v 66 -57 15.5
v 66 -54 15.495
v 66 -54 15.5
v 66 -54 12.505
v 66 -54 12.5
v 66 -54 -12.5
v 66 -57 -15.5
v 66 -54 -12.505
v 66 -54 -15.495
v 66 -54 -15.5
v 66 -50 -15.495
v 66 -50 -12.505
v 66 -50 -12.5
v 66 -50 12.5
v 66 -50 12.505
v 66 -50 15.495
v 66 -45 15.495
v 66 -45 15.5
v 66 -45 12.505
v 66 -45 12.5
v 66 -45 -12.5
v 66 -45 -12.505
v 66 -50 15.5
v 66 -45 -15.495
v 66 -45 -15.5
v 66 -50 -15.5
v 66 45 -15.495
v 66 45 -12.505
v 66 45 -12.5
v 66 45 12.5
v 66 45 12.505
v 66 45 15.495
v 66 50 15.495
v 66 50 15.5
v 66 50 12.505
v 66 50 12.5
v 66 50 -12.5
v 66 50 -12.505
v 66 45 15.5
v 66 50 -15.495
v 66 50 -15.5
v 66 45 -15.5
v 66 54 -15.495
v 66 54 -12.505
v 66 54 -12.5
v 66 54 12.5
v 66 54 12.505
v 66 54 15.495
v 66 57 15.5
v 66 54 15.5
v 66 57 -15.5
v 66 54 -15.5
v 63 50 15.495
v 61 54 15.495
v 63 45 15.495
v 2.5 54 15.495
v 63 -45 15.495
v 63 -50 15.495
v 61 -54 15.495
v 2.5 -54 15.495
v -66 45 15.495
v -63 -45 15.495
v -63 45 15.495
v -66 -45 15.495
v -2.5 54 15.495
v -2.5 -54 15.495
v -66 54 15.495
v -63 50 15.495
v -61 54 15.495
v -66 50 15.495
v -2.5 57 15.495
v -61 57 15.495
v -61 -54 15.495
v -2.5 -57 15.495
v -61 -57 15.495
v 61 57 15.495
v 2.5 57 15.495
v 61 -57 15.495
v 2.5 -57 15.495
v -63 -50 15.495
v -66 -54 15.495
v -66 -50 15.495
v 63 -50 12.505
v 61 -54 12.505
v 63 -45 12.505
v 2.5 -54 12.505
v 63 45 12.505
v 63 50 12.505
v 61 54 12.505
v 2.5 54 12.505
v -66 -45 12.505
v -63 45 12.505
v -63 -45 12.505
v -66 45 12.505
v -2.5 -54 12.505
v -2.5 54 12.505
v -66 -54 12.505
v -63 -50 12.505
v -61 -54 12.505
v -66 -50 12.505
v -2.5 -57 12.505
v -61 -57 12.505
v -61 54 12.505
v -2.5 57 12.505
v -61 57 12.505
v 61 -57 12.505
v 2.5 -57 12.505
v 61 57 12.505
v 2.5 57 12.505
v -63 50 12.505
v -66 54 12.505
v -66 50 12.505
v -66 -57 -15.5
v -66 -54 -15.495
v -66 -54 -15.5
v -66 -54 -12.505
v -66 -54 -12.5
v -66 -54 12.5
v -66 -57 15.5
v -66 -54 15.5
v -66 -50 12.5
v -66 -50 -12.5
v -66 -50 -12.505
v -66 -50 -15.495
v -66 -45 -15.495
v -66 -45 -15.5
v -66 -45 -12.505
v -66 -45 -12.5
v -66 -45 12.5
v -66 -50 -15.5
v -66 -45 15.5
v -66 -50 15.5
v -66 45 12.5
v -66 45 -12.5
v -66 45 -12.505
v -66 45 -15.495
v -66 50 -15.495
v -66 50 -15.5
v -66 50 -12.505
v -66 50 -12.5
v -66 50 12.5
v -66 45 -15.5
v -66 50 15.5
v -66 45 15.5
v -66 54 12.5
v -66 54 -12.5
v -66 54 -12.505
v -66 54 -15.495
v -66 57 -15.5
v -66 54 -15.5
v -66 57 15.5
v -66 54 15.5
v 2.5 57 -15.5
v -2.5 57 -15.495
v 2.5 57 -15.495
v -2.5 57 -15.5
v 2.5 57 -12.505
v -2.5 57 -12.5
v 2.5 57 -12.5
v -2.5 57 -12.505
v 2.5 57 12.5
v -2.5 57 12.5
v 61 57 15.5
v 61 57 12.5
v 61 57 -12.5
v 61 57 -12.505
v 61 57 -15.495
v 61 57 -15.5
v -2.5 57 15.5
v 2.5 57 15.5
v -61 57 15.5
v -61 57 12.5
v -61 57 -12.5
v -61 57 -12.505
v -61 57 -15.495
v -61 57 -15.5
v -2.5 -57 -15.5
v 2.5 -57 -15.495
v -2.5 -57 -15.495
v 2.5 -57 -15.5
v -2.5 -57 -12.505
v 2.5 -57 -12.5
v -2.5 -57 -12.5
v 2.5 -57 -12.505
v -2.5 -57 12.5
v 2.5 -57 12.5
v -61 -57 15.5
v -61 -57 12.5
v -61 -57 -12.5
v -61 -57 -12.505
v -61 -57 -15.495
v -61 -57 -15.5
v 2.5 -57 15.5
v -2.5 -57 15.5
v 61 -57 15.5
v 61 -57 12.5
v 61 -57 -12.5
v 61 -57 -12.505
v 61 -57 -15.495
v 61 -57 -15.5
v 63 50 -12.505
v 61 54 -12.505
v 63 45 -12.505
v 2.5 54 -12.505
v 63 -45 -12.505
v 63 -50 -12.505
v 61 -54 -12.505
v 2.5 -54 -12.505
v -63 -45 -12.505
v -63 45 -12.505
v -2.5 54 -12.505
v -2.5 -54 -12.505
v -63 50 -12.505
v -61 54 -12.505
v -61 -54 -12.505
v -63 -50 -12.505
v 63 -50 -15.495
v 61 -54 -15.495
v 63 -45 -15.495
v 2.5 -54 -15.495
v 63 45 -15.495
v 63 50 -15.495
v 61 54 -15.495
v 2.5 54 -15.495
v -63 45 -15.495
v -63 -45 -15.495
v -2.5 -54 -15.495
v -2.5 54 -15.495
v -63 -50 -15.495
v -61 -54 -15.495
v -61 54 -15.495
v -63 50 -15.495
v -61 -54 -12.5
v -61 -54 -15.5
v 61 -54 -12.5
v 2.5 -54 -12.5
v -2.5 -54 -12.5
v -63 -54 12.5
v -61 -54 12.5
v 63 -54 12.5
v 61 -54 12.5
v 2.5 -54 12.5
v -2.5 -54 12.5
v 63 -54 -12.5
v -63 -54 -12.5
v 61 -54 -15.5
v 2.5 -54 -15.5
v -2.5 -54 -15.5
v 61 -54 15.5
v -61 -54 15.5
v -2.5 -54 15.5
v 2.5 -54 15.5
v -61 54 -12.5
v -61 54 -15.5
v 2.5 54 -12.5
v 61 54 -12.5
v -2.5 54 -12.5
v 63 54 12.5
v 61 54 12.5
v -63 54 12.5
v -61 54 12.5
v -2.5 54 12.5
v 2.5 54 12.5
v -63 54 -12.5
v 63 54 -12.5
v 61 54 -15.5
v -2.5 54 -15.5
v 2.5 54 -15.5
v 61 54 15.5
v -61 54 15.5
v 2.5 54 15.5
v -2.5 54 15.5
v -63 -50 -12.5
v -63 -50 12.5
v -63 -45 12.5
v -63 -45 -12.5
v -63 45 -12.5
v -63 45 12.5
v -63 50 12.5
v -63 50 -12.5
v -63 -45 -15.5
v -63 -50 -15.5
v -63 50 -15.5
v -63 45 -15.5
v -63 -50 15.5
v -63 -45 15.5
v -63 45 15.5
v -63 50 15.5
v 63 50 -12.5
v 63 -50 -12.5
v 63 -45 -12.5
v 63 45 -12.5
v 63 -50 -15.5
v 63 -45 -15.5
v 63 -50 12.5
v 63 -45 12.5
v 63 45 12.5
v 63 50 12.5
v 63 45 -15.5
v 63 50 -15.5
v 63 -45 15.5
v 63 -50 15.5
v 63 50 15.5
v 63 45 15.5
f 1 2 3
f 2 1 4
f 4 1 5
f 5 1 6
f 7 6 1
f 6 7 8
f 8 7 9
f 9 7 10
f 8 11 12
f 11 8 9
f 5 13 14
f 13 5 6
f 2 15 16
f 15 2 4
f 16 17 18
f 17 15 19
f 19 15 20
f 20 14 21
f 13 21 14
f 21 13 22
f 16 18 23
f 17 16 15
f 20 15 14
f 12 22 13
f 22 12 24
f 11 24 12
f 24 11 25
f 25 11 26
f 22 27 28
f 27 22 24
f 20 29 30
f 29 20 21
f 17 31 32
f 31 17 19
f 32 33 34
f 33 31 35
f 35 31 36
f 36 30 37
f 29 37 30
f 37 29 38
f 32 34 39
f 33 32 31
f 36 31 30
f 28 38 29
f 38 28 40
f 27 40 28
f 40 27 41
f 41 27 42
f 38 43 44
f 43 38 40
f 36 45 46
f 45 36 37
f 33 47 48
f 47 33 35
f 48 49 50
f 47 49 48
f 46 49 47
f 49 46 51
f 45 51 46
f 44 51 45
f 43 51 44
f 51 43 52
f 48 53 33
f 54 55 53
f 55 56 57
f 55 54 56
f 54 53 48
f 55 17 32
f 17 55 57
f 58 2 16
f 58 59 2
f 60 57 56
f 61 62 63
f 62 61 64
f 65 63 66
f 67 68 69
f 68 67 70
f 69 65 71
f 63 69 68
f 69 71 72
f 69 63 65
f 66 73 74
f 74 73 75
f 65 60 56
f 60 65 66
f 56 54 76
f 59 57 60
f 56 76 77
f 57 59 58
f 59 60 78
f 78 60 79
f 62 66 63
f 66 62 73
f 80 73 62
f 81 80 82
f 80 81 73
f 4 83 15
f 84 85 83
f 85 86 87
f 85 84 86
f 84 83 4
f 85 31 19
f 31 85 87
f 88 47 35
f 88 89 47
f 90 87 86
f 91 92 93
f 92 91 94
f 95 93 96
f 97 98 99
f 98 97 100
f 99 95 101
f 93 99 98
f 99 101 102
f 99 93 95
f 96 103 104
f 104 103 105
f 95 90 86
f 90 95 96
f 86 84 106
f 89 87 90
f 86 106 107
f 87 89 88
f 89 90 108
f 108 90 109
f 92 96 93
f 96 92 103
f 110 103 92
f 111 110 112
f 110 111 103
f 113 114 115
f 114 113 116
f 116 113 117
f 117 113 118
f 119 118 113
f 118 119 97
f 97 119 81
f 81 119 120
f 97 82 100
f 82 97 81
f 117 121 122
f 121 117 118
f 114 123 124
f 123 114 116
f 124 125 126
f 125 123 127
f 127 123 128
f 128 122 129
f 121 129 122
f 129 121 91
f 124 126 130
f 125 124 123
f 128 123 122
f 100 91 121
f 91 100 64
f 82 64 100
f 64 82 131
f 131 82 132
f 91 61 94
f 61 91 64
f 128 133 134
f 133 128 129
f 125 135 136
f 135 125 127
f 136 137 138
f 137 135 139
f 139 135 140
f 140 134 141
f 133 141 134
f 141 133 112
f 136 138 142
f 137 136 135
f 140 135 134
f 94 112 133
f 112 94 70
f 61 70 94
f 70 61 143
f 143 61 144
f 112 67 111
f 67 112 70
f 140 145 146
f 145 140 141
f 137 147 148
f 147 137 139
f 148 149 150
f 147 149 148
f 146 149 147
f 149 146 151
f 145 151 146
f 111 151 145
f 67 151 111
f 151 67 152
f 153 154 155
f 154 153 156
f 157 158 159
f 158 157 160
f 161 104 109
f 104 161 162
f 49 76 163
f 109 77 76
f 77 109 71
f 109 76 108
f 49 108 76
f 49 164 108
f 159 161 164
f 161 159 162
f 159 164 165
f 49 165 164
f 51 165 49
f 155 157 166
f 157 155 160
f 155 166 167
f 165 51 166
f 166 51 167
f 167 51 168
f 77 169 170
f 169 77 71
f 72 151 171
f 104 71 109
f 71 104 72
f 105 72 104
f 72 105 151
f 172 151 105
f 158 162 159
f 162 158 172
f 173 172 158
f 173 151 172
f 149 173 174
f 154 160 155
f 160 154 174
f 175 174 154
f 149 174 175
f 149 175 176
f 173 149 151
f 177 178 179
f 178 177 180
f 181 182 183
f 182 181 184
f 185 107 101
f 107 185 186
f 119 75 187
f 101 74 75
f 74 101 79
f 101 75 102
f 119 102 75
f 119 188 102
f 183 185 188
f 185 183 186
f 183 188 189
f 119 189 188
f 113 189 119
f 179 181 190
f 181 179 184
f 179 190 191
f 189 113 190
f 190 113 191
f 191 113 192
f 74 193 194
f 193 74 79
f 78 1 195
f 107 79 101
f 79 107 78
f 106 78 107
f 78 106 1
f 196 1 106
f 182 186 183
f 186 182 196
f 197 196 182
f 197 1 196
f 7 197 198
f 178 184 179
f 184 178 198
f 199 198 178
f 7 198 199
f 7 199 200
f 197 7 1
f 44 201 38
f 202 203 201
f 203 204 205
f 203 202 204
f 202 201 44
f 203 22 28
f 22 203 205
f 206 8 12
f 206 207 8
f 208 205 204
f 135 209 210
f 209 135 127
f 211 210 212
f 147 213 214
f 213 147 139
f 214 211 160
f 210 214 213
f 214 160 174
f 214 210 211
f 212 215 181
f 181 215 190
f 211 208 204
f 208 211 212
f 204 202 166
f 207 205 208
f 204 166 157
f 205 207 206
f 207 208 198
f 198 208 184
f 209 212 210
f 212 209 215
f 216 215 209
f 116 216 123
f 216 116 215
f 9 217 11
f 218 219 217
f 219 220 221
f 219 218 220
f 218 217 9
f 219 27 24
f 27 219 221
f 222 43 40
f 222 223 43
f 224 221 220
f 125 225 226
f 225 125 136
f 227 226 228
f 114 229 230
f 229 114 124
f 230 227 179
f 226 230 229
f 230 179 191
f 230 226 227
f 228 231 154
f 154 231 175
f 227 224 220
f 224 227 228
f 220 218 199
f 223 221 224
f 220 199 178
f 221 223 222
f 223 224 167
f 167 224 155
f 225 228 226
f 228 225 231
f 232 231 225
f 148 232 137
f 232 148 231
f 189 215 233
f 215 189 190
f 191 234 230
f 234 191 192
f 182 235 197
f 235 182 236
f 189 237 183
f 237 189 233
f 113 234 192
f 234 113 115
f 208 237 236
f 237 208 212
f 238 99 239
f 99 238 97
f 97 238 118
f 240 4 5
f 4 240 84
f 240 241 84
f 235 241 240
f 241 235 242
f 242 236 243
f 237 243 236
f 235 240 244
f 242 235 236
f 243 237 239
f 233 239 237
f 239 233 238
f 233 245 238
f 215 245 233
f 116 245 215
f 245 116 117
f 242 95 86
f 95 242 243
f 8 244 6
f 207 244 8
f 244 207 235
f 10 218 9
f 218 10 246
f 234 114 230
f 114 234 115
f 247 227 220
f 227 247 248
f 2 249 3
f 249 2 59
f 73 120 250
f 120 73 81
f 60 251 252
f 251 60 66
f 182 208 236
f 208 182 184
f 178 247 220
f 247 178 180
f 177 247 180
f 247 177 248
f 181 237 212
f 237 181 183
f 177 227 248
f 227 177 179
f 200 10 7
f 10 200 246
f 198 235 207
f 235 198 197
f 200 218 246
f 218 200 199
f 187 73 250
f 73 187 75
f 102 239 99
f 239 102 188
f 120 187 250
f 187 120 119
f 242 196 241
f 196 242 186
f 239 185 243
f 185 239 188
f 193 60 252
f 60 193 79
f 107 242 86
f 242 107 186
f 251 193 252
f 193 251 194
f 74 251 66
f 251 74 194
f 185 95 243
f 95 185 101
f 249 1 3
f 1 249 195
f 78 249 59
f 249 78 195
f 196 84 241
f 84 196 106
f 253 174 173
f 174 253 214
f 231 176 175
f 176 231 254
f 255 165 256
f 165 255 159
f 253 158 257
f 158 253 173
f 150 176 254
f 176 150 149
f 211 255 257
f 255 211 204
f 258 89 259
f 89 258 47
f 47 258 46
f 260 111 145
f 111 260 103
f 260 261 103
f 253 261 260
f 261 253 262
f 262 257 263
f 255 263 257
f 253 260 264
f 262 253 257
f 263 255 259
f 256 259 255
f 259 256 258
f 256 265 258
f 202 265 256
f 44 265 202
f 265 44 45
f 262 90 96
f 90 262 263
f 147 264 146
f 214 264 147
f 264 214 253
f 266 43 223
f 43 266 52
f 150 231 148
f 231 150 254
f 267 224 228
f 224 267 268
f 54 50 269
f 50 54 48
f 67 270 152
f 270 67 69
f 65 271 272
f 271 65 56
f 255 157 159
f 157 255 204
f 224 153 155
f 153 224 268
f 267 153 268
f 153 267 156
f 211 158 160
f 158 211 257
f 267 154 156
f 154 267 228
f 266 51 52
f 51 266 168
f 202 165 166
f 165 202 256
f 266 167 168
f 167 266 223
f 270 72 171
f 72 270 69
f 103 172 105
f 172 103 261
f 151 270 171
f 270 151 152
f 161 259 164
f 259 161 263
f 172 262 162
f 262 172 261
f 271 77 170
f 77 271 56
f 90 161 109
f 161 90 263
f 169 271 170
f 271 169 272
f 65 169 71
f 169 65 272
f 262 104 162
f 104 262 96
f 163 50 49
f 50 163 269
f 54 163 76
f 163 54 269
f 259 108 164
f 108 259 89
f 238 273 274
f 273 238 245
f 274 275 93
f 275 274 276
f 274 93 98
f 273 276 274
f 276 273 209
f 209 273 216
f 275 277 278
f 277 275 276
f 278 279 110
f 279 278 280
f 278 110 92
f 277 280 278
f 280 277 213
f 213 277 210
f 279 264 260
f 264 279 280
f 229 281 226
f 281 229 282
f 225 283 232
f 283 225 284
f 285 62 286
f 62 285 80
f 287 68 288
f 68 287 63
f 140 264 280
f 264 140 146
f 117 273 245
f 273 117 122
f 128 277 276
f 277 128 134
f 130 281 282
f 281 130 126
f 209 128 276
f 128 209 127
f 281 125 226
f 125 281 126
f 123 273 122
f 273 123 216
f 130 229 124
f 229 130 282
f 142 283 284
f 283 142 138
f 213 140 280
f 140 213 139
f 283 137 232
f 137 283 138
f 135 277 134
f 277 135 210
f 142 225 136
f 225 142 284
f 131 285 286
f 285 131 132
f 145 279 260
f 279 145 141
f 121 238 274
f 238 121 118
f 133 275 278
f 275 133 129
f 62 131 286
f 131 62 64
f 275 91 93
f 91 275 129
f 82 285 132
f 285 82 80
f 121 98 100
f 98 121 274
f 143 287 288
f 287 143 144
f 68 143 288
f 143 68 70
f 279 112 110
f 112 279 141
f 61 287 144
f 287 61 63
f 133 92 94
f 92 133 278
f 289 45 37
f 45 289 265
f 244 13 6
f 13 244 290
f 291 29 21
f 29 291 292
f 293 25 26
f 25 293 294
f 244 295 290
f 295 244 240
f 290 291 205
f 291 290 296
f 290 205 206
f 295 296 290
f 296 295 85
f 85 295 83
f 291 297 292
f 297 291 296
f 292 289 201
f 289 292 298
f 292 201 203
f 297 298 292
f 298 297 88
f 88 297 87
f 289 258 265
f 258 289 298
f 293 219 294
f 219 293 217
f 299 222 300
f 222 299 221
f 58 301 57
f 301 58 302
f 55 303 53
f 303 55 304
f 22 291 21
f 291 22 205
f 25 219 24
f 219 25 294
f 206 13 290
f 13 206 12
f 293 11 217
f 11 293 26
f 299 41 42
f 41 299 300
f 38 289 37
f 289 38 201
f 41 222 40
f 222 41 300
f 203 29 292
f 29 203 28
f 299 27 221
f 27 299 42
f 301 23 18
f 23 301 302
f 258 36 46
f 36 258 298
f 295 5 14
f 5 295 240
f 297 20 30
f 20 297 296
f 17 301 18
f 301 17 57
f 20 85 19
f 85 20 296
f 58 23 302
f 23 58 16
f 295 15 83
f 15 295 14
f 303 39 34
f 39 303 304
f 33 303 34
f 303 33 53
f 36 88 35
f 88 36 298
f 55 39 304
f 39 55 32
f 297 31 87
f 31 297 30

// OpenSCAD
/*
mixer case
by stahl
[office@stahlnow.com]

released under the permissive MIT license

file history
v1.0 - born
*/

/*********************************************** START OF USER VARIABLES */
// what to build
laser = false;  // set to true for laser cut rendering
render(laser);

// define inner volume in mm
length = 108;
width = 126;
height = 25; // thing + spacer + extra space

thickness = 3; // thickness of material

// slots configuration
slots = true; // make slots?

// overlap of top/bottom panels in mm
overlap = 0;
// round edge or not (applies only if overlap > 0)
round_edges = true;

// slots configuration
num_slots_right_left = 2;       // number of slots >= 0
slot_width_right_left = 5;     // width of slot
slot_clearance_right_left = 4;  // inset to slot >= 0, add plus or minus 0.1 if last tooth is missing
num_slots_front_back = 3;       
slot_width_front_back = 5;
slot_clearance_front_back = 0.0;  // inset to slot >= 0, add plus or minus 0.1 if last tooth is missing

// t-joints configuration
t_joints_front = false;
t_joints_back = false;
t_joints_right = false;
t_joints_left = false;
t_joints_top_bottom = false;

num_t_joints = 1; // number of t-joints
bolt_size = 3; // bolt size in mm (M2,M3,M4,M5, etc.)
bolt_length = 13; // bolt length in mm

// clearence between panel edge and t-joint
// could be set to a number instead of calculation
t_joints_top_left_clearance = length/(2*num_t_joints); 
t_joints_right_left_clearance = height/(2*num_t_joints);
t_joints_front_back_clearance = width/(2*num_t_joints);

joints_inset = 2; // clearance between panel edge and hole
nut_size = 7.5;// M3: 5.5, M4: 7.2, M5: 8.0
nut_thickness = 3.5;// M3: 2.4, M4: 3.5 M5: 5.6

// clearance for laser cutting in mm
laser_clearance = 5;

// colors
col_alpha = 0.8;
col_top =  "DarkGrey";
col_bottom = "DarkGrey";
col_left = "Yellow";
col_right = col_left;
col_front = "LightBlue";
col_back = "Green";

// number of fragments for round edges
$fn = 100;

glitch_corr = 0.1; // visual glitch correction (careful, this will mess with dimensions!)

/************************************************* END OF USER VARIABLES */
module render(laser) {
    if (laser) {
        laser();
    } else {
        3d();
    }
}

module 3d() {
    /*
    color("Yellow", 0.9)
    rotate([0, 0, 0])
    translate([57.5, -20.5,2.5])
    import("mixerli_v2.0.stl");
    */
    
    top();
    bottom();
    front();
    back();
    left();
    right();
}

module laser() {
    glitch_corr = 0.0; // set glitch correction to zero
    // top
    rotate([0, 0, 180])
    if (slots) {
        projection() difference() {
            top();
            right();
            left();
            slots_front_back(-(length+thickness)/2.0);
            slots_front_back((length+thickness)/2.0);
        }
    } else {
        projection() mirror([1,0,0]) top();
    }

    // bottom
    bottom_offset = -(length+2*thickness+2*overlap+laser_clearance);
    translate([0,bottom_offset,0])
    rotate([0, 0, 180]) mirror([1,0,0])
    
    if (slots) {
        projection() difference() {
            bottom();
            right();
            left();        
            slots_front_back(-(length+thickness)/2.0);
            slots_front_back((length+thickness)/2.0);
        }
    } else {
        projection() bottom();
    }
    
    // front
    front_offset = bottom_offset-(length+height)/2-overlap-2*thickness-laser_clearance;
    projection() translate([0,front_offset,0]) rotate([-90,0,180])
    
    if (slots) {
        difference() {
            front();
            slots_right_left(-(width+thickness)/2);
            slots_right_left((width+thickness)/2);
        }
    } else {
        projection() front();
    }
    
    
    // back
    back_offset = front_offset-height-2*thickness-laser_clearance;
    projection() translate([0,back_offset,0]) rotate([-90,0,180]) mirror([1,0,0]) 
    if (slots) {
        difference() {
            back();
            slots_right_left(-(width+thickness)/2);
            slots_right_left((width+thickness)/2);
        }
    } else {
        projection() back();
    }

    // left
    left_offset = back_offset-height-2*thickness-laser_clearance;
    projection() translate([0,left_offset,0]) rotate([0,90,90]) left();
    
    // right
    right_offset = left_offset-height-2*thickness-laser_clearance;
    projection() translate([0,right_offset,0]) rotate([0,90,90]) right();
    
}


module top() {
    if (round_edges) {
        p = 0;
    } else {
        p = overlap;
    }
    
    difference() {
        union() color(col_top, col_alpha) {
            minkowski()
            {
                translate([0,0, (height+thickness)/2])
                if (!round_edges) {
                    cube([width+2*thickness+overlap, length+overlap+2*thickness, thickness-0.01], center=true);
                } else {
                    cube([width+2*thickness, length+2*thickness, thickness-0.01], center=true);
                }
                if (round_edges) cylinder(r=overlap, h=0.001, $fn=100);
            }
        }
        t_joints_holes_top_bottom();
        t_joints_holes_front_back();       
        // cutouts
        color("silver")
        translate([0.0, 0.0, (height-thickness)/2])
        linear_extrude(thickness*3)
        import(file = "mixerli_v2.0_top_cutout.dxf", layer = "0");
        // engraving
        color("white")
        translate([0.0, 0.0, height/2])
        linear_extrude(thickness)
        import(file = "mixerli_v2.0_top_cutout.dxf", layer = "engraving");
    }
}

module bottom() {
    if (round_edges) {
        p = 0;
    } else {
        p = overlap;
    }
    
    difference() {
        union() color(col_bottom, col_alpha) {
            minkowski()
            {
                translate([0,0, -(height+thickness)/2])
                if (!round_edges) {
                    cube([width+2*thickness+overlap, length+overlap+2*thickness, thickness-0.01], center=true);
                } else {
                    cube([width+2*thickness, length+2*thickness, thickness-0.01], center=true);
                }
                if (round_edges) cylinder(r=overlap, h=0.001, $fn=100);
            }
        }
        t_joints_holes_top_bottom();
        t_joints_holes_front_back();
        // cutouts
        color("silver")
        mirror([1,0,0]) translate([0.0, 0.0, -height/2-1.5*thickness])
        linear_extrude(thickness*2)
        import(file = "mixerli_v2.0_bottom_cutout.dxf", layer = "0");
        // engraving
        color("white")
        mirror([1,0,0]) translate([0.0, 0.0, -height/2-thickness])
        linear_extrude(thickness)
        import(file = "mixerli_v2.0_bottom_cutout.dxf", layer = "engraving");
    }
   
}

module front() { 
    difference() {
        union() color(col_front, col_alpha) {
            translate([0.0, -(length+thickness)/2.0, 0.0])
            cube([width+2.0*thickness, thickness, height], center=true);
            // slots
            if (slots)
                slots_front_back(-(length+thickness)/2.0);
        }
        
        // t-joints
        if (t_joints_front)
            t_joints_front_back(-(length+thickness)/2.0);
        // t-joints holes (on the side)
        t_joints_holes_right_left();
        
        // cutouts
        color("silver")
        translate([0,-length/2+thickness,0]) 
        rotate([90,0,0])
        linear_extrude(thickness*3)
        import(file = "mixerli_v2.0_front_cutout.dxf", layer = "0");
        // engraving
        color("white")
        translate([0,-length/2,0]) 
        rotate([90,0,0])
        linear_extrude(thickness)
        import(file = "mixerli_v2.0_front_cutout.dxf", layer = "engraving");        
    }
}

module back() {
    difference() {
        union()
        color(col_back, col_alpha) {
            translate([0.0, (length + thickness)/2.0, 0.0])
            cube([width+2.0*thickness, thickness, height], center=true);
            if (slots)
                slots_front_back((length+thickness)/2.0);
        }
        
        // t-joints
        if (t_joints_back)
            t_joints_front_back((length+thickness)/2.0);
        // t-joints holes (on the side)
        t_joints_holes_right_left();
        
        // cutouts
        color("silver")
        mirror([1,0,0]) rotate([90,0,0]) translate([0,0,-(length/2)-1.5*thickness]) 
        linear_extrude(thickness*2)
        import(file = "mixerli_v2.0_back_cutout.dxf", layer = "0");
        // engraving
        color("White")
        mirror([1,0,0]) rotate([90,0,0]) translate([0,0,-(length/2)-1.5*thickness]) 
        linear_extrude(thickness*3)
        import(file = "mixerli_v2.0_back_cutout.dxf", layer = "engraving");
    }
}

module t_joints_holes_right_left() {
    if (t_joints_left)
        t_joints_right_left(-(width+thickness)/2.0+joints_inset, true);
    if (t_joints_right)
        t_joints_right_left((width+thickness)/2.0-joints_inset, true);
}

module t_joints_holes_top_bottom() {
    if (t_joints_top_bottom) {
        t_joints_top_bottom(-(width+thickness)/2.0+joints_inset, true);
        t_joints_top_bottom((width+thickness)/2.0-joints_inset, true);
    }
}

module t_joints_holes_front_back() {
    if (t_joints_front)
        t_joints_front_back(-(length+thickness)/2.0+joints_inset, true);
    if (t_joints_back)
        t_joints_front_back((length+thickness)/2.0-joints_inset, true);
}

module slots_front_back(d) {
    of = slot_width_front_back/2.0-thickness + slot_clearance_front_back;
    for (z = [-(height+thickness)/2.0 : height+thickness : (height+thickness)/2.0 ])
        for (x = [-width/2.0+of: (width-(2.0*of))/(num_slots_front_back-1.0) : width/2.0-of])
            translate([x, d, z])
            cube([slot_width_front_back, thickness, thickness], center=true);
}

module left() {
    difference() {
        union()
        color(col_left, col_alpha)
        {
            // panel
            translate([-(width+thickness)/2, 0, 0])
            cube([thickness, length, height], center=true);
            // slots
            if (slots)
                slots_right_left(-(width+thickness)/2);
        }
        // t-joints
        if (t_joints_left) {
            t_joints_right_left(-(width+thickness)/2);
        }
        if (t_joints_top_bottom) {
            t_joints_top_bottom(-(width+thickness)/2);
        }
        // cutouts
        color("silver")
        rotate([0,0,-90]) rotate([90,0,0]) translate([0,0,(width-thickness)/2])
        linear_extrude(thickness*2)
        import(file = "left_cutout.dxf", layer = "0");
    }
}

module right() {
    difference() {
        union()
        color(col_right, col_alpha)
        {
            // panel
            translate([(width+thickness)/2, 0, 0])
            cube([thickness, length, height], center=true);
            // slots
            if (slots)
                slots_right_left((width+thickness)/2);
        }
        // t-joints
        if (t_joints_right) {
            t_joints_right_left((width+thickness)/2);
        }
        if (t_joints_top_bottom) {
            t_joints_top_bottom((width+thickness)/2);
        }
        // cutouts
        color("silver")
        rotate([0,0,90]) rotate([90,0,0]) translate([0,0,width/2-0.5*thickness])
        linear_extrude(thickness*2)
        import(file = "right_cutout.dxf", layer = "0");
    }
}

module t_joints_front_back(w, holes=false) {
    dx = (bolt_size < thickness) ? thickness : bolt_size;
    
    for (z = [-(height-bolt_length)/2, (height-bolt_length)/2, (height-bolt_length)/2])
        for (x = [-(width-bolt_size)/2+t_joints_front_back_clearance:(width-bolt_size-2*t_joints_front_back_clearance)/(num_t_joints-1):(width+bolt_size)/2-t_joints_front_back_clearance])
            color("silver")
            translate([0,w,0])
            translate([x, 0, z])
            if (holes) {
                cylinder(h=bolt_length*2, d=bolt_size, center=true);
            }
            else {
                rotate([90,0,0])
                cube([bolt_size, bolt_length, dx+glitch_corr], center=true);
                rotate([90,0,0])
                cube([nut_size, nut_thickness, nut_size+glitch_corr], center=true);
            }
}

module t_joints_right_left(w, holes=false) {   // w is for right / left side offset    
    dx = (bolt_size < thickness) ? thickness : bolt_size;
    
    for (y = [-(length-bolt_length)/2, (length-bolt_length)/2, (length-bolt_length)/2])
        for (z = [-(height-bolt_size)/2+t_joints_right_left_clearance:(height-bolt_size-2*t_joints_right_left_clearance)/(num_t_joints-1):(height+bolt_size)/2-t_joints_right_left_clearance])
            color("silver")
            translate([w,0,0])
            translate([0, y, z])
            if (holes) {
                rotate([90,0,0])
                cylinder(h=bolt_length*2, d=bolt_size, center=true);
            }
            else {
                cube([dx+glitch_corr, bolt_length, bolt_size+glitch_corr], center=true);
                cube([dx+glitch_corr, nut_thickness, nut_size+glitch_corr], center=true);
            }
}

module t_joints_top_bottom(w, holes=false) {   // w is for right / left side offset    
    dx = (bolt_size < thickness) ? thickness : bolt_size;
    
    // right + left side
    for (z = [-(height-bolt_length)/2.0 : height-bolt_length : (height-bolt_length)/2.0 ])
        for (y = [-(length-bolt_size)/2+t_joints_top_left_clearance:(length-bolt_size-2*t_joints_top_left_clearance)/(num_t_joints-1):(length+bolt_size)/2-t_joints_top_left_clearance])
            color("silver")
            translate([w,0,0])
            translate([0, y, z])
            if (holes) {
                cylinder(h=bolt_length*2, d=bolt_size, center=true);
            }
            else {
                cube([dx+glitch_corr, bolt_size+glitch_corr, bolt_length], center=true);
                cube([dx+glitch_corr, nut_size+glitch_corr, nut_thickness], center=true);
            }
    
            /*
    // front + back side
    for (z = [-(height-bolt_length)/2.0 : height-bolt_length : (height-bolt_length)/2.0 ])
        for (x = [-(width-bolt_size)/2+t_joints_top_left_clearance:(width-bolt_size-2*t_joints_top_left_clearance)/(num_t_joints-1):(width+bolt_size)/2-t_joints_top_left_clearance])
            color("silver")
            translate([w,0,0])
            translate([x, 0, z])
            if (holes) {
                cylinder(h=bolt_length*2, d=bolt_size, center=true);
            }
            else {
                cube([dx+glitch_corr, bolt_size+glitch_corr, bolt_length], center=true);
                //translate([0,bolt_length/2,0])
                cube([dx+glitch_corr, nut_size+glitch_corr, nut_thickness], center=true);
            }
            */
}

module slots_right_left(w) {    // w is for right / left side offset
    of = slot_width_right_left/2.0 + slot_clearance_right_left;
    // on top / bottom
    for (z = [-(height+thickness)/2 : height+thickness : (height+thickness)/2 ])
        for (x = [-length/2 + of : (length-(2.0*of))/(num_slots_right_left-1) : length/2.0 - of])
            translate([w, x, z])
            cube([thickness, slot_width_right_left, thickness], center=true);
    // sides
    for (y = [-(length+thickness)/2 : length+thickness : (length+thickness)/2 ])
        for (z = [-height/2 + of : (height-(2.0*of))/(num_slots_right_left-1) : height/2.0 - of])
            translate([w, y, z])
            cube([thickness, thickness, slot_width_right_left], center=true);
}
